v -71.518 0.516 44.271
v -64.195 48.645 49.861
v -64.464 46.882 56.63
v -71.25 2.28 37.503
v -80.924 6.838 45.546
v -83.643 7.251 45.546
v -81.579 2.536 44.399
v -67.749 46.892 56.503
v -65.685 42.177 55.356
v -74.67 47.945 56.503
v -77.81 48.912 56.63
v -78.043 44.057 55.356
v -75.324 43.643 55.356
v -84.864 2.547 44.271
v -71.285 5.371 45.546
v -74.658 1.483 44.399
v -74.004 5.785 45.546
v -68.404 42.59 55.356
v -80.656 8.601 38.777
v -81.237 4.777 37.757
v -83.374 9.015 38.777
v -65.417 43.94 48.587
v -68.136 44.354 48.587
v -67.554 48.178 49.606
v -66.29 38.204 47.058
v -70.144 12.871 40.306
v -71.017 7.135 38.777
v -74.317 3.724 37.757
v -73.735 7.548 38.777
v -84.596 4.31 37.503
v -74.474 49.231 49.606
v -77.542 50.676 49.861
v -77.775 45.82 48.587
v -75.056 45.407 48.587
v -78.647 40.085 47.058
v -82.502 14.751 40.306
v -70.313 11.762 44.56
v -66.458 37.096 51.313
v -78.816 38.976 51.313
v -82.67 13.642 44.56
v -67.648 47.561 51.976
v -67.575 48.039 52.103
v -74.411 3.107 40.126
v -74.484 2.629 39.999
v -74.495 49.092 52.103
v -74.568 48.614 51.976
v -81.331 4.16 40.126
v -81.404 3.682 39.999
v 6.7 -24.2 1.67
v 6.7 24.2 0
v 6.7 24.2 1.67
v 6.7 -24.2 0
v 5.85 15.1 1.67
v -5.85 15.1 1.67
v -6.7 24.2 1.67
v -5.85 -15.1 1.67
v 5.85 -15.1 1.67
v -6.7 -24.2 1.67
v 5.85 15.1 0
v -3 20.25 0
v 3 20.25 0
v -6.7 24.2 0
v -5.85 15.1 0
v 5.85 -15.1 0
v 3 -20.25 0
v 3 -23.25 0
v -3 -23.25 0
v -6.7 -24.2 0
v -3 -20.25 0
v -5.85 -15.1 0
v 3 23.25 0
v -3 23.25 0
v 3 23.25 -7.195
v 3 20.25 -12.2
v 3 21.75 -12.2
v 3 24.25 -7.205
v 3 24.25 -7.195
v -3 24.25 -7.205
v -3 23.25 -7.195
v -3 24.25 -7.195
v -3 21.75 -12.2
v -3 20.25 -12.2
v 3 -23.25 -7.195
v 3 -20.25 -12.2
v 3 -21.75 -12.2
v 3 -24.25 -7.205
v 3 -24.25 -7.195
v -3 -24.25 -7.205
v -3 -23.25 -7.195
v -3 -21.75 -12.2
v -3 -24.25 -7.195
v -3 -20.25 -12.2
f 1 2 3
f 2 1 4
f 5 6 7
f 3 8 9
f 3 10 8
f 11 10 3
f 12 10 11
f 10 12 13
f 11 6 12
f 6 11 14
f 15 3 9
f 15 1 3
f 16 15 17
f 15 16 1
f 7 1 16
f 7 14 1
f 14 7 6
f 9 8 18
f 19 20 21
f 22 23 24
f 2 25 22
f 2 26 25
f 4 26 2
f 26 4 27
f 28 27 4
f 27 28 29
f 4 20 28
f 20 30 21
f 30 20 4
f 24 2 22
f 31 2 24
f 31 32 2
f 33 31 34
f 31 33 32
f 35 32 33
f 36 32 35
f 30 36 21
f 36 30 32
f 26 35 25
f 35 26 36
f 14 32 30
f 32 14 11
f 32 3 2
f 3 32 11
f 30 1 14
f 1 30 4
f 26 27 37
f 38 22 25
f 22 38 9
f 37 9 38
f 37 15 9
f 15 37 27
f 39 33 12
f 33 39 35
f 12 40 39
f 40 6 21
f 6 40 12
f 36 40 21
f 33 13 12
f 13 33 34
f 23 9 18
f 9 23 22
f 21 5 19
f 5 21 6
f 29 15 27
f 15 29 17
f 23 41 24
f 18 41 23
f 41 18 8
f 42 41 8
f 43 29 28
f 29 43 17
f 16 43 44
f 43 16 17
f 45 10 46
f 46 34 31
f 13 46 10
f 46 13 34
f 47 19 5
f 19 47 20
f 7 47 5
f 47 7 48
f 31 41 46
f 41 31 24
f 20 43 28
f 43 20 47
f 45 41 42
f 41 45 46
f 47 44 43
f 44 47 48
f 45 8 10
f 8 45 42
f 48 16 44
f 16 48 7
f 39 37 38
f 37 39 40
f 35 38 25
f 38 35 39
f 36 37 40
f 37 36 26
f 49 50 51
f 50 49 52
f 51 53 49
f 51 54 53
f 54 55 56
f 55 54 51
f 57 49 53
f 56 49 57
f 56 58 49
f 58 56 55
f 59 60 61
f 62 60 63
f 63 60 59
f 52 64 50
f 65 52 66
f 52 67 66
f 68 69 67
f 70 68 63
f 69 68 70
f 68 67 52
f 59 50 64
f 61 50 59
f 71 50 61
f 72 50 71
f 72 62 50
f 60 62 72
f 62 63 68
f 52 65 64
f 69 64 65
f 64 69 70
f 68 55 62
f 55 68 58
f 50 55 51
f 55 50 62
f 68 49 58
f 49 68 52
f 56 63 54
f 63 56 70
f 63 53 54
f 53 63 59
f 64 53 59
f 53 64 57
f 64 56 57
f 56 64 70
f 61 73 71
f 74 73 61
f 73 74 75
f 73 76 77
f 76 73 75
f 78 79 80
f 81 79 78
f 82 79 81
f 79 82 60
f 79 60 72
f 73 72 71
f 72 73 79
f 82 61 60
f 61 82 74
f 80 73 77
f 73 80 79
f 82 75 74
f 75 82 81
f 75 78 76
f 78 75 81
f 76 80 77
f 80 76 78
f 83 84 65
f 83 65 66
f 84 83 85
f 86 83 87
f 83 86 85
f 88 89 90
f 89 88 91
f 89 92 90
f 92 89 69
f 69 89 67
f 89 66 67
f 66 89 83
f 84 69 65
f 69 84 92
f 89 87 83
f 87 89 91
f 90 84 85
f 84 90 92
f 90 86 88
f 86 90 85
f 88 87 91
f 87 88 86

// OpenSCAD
// Generated by SolidPython 1.1.3 on 2025-12-02 19:42:02


union() {
	translate(v = [-74.52985690209567, 25.595877133079668, 47.06634805542881]) {
		rotate(a = [14.7627925 , 0.        ,-8.65071739]) {
			union() {
				difference() {
					cube(center = true, size = [13.5000000000, 48.5000000000, 7.0000000000]);
					cube(center = true, size = [12.5000000000, 38.5000000000, 7.1000000000]);
					cube(center = true, size = [7.0000000000, 46.5000000000, 7.1000000000]);
					translate(v = [0.0000000000, 0.0000000000, 2.5000000000]) {
						cube(center = true, size = [7.0000000000, 47.5000000000, 7.1000000000]);
					}
				}
				translate(v = [0.0000000000, 0.0000000000, -1.3000000000]) {
					cube(center = true, size = [12.6000000000, 26.5000000000, 4.4000000000]);
				}
			}
		}
	}
	union() {
		difference() {
			translate(v = [0.0000000000, 0.0000000000, 0.8350000000]) {
				cube(center = true, size = [13.4000000000, 48.4000000000, 1.6700000000]);
			}
			translate(v = [0.0000000000, 0.0000000000, 1.6700000000]) {
				hull() {
					cube(center = true, size = [11.7000000000, 30.2000000000, 0.0100000000]);
					cube(center = true, size = [11.7000000000, 30.2000000000, 3.4235000000]);
				}
			}
		}
		translate(v = [0.0000000000, 21.7500000000, 0.0000000000]) {
			union() {
				translate(v = [0.0000000000, 0.0000000000, -3.6000000000]) {
					cube(center = true, size = [6.0000000000, 3.0000000000, 7.2000000000]);
				}
				translate(v = [0.0000000000, 0.5000000000, -7.2000000000]) {
					hull() {
						cube(center = true, size = [6.0000000000, 4.0000000000, 0.0100000000]);
						translate(v = [0.0000000000, -1.2500000000, -2.5000000000]) {
							cube(center = true, size = [6.0000000000, 1.5000000000, 5.0000000000]);
						}
					}
				}
			}
		}
		mirror(v = [0, 1, 0]) {
			translate(v = [0.0000000000, 21.7500000000, 0.0000000000]) {
				union() {
					translate(v = [0.0000000000, 0.0000000000, -3.6000000000]) {
						cube(center = true, size = [6.0000000000, 3.0000000000, 7.2000000000]);
					}
					translate(v = [0.0000000000, 0.5000000000, -7.2000000000]) {
						hull() {
							cube(center = true, size = [6.0000000000, 4.0000000000, 0.0100000000]);
							translate(v = [0.0000000000, -1.2500000000, -2.5000000000]) {
								cube(center = true, size = [6.0000000000, 1.5000000000, 5.0000000000]);
							}
						}
					}
				}
			}
		}
	}
}
/***********************************************
*********      SolidPython code:      **********
************************************************
 
import solid as sl

debug_trace = False

def debugprint(info):
    if debug_trace:
        print(info)

def box(width, height, depth):
    return sl.cube([width, height, depth], center=True)


def cylinder(radius, height, segments=100):
    return sl.cylinder(r=radius, h=height, segments=segments, center=True)


def sphere(radius):
    return sl.sphere(radius)


def cone(r1, r2, height):
    return sl.cylinder(r1=r1, r2=r2, h=height)  # , center=True)


def rotate(shape, angle):
    if shape is None:
        return None
    return sl.rotate(angle)(shape)


def translate(shape, vector):
    if shape is None:
        return None
    return sl.translate(tuple(vector))(shape)


def mirror(shape, plane=None):
    debugprint('mirror()')
    planes = {
        'XY': [0, 0, 1],
        'YX': [0, 0, -1],
        'XZ': [0, 1, 0],
        'ZX': [0, -1, 0],
        'YZ': [1, 0, 0],
        'ZY': [-1, 0, 0],
    }
    return sl.mirror(planes[plane])(shape)


def union(shapes):
    debugprint('union()')
    shape = None
    for item in shapes:
        if item is not None:
            if shape is None:
                shape = item
            else:
                shape += item
    return shape


def add(shapes):
    debugprint('union()')
    shape = None
    for item in shapes:
        if item is not None:
            if shape is None:
                shape = item
            else:
                shape += item
    return shape


def difference(shape, shapes):
    debugprint('difference()')
    for item in shapes:
        if item is not None:
            shape -= item
    return shape


def intersect(shape1, shape2):
    if shape2 is not None:
        return sl.intersection()(shape1, shape2)
    else:
        return shape1

def hull_from_points(points):
    return sl.hull()(*points)


def hull_from_shapes(shapes, points=None):
    hs = []
    if points is not None:
        hs.extend(points)
    if shapes is not None:
        hs.extend(shapes)
    return sl.hull()(*hs)


def tess_hull(shapes, sl_tol=.5, sl_angTol=1):
    return sl.hull()(*shapes)


def triangle_hulls(shapes):
    debugprint('triangle_hulls()')
    hulls = []
    for i in range(len(shapes) - 2):
        hulls.append(hull_from_shapes(shapes[i: (i + 3)]))

    return union(hulls)



def bottom_hull(p, height=0.001):
    debugprint("bottom_hull()")
    shape = None
    for item in p:
        proj = sl.projection()(p)
        t_shape = sl.linear_extrude(height=height, twist=0, convexity=0, center=True)(
            proj
        )
        t_shape = sl.translate([0, 0, height / 2 - 10])(t_shape)
        if shape is None:
            shape = t_shape
        shape = sl.hull()(p, shape, t_shape)
    return shape

def polyline(point_list):
    return sl.polygon(point_list)


# def project_to_plate():
#     square = cq.Workplane('XY').rect(1000, 1000)
#     for wire in square.wires().objects:
#         plane = cq.Workplane('XY').add(cq.Face.makeFromWires(wire))

def extrude_poly(outer_poly, inner_polys=None, height=1):
    if inner_polys is not None:
        return sl.linear_extrude(height=height, twist=0, convexity=0, center=True)(outer_poly, *inner_polys)
    else:
        return sl.linear_extrude(height=height, twist=0, convexity=0, center=True)(outer_poly)


def import_file(fname, convexity=2):
    print("IMPORTING FROM {}".format(fname))
    return sl.import_stl(fname.replace("\\", "/") + ".stl", convexity=convexity)


def export_file(shape, fname):
    print("EXPORTING TO {}".format(fname))
    sl.scad_render_to_file(shape, fname + ".scad")


def export_dxf(shape, fname):
    print("NO DXF EXPORT FOR SOLID".format(fname))
    pass 
 
************************************************/
